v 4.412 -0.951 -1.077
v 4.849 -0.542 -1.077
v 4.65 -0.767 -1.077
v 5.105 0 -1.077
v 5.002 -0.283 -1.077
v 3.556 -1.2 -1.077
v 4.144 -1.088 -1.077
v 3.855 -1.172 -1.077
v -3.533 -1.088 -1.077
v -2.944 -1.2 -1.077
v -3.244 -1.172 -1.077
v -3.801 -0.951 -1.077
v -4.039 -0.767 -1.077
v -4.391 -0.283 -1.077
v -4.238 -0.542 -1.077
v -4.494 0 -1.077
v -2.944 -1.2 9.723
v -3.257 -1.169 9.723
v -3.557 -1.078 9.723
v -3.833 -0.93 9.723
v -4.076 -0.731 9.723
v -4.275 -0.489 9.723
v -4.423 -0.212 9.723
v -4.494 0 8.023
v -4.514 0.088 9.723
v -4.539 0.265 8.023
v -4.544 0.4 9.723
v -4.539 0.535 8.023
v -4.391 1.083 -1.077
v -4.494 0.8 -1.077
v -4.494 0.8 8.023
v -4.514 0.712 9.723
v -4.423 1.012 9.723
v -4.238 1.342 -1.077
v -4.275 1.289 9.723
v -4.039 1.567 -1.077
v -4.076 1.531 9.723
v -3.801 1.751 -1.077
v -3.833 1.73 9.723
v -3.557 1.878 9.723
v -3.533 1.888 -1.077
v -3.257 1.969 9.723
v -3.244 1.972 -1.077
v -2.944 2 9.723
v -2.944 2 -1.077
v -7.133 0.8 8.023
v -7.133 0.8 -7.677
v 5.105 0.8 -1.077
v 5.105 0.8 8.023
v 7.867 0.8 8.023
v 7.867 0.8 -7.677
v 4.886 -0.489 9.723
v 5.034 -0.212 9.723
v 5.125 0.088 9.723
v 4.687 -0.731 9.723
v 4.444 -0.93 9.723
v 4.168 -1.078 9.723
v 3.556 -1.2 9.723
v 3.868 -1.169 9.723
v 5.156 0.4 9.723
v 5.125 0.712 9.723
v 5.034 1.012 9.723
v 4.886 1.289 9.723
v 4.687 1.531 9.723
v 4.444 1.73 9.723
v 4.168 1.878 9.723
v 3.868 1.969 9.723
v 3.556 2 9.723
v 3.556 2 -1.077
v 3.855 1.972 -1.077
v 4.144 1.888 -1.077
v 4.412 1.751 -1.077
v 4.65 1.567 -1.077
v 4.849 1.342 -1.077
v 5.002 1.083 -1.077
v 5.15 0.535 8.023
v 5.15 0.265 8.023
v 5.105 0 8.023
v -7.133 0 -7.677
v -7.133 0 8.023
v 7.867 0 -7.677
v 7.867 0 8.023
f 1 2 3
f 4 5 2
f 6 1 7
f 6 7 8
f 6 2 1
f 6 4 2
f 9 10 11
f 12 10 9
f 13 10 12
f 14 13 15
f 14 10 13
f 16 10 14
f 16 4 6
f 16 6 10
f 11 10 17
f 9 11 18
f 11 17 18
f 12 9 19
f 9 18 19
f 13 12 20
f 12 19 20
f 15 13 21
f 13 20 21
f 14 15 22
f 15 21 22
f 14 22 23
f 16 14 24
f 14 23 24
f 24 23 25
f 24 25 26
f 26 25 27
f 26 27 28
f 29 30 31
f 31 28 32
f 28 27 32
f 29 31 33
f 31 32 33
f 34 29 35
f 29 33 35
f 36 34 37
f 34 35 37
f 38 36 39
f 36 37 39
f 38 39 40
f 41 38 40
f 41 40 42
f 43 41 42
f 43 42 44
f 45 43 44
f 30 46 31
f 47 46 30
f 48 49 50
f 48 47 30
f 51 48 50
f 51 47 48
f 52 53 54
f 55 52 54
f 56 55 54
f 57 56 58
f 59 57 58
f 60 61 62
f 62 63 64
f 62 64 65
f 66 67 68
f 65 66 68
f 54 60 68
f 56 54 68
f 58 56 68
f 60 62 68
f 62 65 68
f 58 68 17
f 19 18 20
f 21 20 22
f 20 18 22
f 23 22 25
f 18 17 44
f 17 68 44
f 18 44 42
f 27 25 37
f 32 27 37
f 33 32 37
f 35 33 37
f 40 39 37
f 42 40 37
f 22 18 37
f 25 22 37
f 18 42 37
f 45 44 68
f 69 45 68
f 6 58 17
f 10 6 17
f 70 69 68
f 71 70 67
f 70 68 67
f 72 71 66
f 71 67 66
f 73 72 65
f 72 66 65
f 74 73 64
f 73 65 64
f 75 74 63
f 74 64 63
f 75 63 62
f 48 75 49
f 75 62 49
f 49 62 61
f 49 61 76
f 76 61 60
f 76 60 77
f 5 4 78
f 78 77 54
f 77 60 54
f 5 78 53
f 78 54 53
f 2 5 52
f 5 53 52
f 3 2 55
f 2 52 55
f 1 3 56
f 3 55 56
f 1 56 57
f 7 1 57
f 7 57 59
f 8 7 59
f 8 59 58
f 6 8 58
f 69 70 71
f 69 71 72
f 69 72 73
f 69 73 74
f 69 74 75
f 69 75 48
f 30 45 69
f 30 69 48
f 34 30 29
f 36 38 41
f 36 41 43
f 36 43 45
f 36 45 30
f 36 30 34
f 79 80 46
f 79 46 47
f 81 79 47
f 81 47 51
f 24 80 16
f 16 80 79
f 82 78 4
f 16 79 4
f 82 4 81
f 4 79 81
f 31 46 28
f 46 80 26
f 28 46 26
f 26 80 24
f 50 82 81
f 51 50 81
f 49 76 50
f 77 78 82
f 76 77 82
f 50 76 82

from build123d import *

# Parameters (mm, degrees)
SKETCH1_W           = 15
SKETCH1_H           = 15.7
BOSS_EXTRUDE1_DEPTH = 0.8
BOSS_EXTRUDE2_DEPTH = 10.8


with BuildPart() as part:
    # Sketch1 → Boss-Extrude1 (new body)
    with BuildSketch(Plane(origin=(0, 0, 0), x_dir=(1, 0, 0), z_dir=(0, 1, 0))):
        with Locations((0.367290749, -0.172907489)):
            Rectangle(SKETCH1_W, SKETCH1_H)
    extrude(amount=BOSS_EXTRUDE1_DEPTH)

    # Sketch2 → Boss-Extrude2 (add)
    with BuildSketch(Plane.XY.offset(9.722907489)):
        with BuildLine():
            Line((-2.944438856, 2), (3.555561144, 2))
            ThreePointArc((3.555561144, 2), (5.155561144, 0.4), (3.555561144, -1.2))
            Line((3.555561144, -1.2), (-2.944438856, -1.2))
            ThreePointArc((-2.944438856, -1.2), (-4.544438856, 0.4), (-2.944438856, 2))
        make_face()
    extrude(amount=-BOSS_EXTRUDE2_DEPTH)


solid = part.part
